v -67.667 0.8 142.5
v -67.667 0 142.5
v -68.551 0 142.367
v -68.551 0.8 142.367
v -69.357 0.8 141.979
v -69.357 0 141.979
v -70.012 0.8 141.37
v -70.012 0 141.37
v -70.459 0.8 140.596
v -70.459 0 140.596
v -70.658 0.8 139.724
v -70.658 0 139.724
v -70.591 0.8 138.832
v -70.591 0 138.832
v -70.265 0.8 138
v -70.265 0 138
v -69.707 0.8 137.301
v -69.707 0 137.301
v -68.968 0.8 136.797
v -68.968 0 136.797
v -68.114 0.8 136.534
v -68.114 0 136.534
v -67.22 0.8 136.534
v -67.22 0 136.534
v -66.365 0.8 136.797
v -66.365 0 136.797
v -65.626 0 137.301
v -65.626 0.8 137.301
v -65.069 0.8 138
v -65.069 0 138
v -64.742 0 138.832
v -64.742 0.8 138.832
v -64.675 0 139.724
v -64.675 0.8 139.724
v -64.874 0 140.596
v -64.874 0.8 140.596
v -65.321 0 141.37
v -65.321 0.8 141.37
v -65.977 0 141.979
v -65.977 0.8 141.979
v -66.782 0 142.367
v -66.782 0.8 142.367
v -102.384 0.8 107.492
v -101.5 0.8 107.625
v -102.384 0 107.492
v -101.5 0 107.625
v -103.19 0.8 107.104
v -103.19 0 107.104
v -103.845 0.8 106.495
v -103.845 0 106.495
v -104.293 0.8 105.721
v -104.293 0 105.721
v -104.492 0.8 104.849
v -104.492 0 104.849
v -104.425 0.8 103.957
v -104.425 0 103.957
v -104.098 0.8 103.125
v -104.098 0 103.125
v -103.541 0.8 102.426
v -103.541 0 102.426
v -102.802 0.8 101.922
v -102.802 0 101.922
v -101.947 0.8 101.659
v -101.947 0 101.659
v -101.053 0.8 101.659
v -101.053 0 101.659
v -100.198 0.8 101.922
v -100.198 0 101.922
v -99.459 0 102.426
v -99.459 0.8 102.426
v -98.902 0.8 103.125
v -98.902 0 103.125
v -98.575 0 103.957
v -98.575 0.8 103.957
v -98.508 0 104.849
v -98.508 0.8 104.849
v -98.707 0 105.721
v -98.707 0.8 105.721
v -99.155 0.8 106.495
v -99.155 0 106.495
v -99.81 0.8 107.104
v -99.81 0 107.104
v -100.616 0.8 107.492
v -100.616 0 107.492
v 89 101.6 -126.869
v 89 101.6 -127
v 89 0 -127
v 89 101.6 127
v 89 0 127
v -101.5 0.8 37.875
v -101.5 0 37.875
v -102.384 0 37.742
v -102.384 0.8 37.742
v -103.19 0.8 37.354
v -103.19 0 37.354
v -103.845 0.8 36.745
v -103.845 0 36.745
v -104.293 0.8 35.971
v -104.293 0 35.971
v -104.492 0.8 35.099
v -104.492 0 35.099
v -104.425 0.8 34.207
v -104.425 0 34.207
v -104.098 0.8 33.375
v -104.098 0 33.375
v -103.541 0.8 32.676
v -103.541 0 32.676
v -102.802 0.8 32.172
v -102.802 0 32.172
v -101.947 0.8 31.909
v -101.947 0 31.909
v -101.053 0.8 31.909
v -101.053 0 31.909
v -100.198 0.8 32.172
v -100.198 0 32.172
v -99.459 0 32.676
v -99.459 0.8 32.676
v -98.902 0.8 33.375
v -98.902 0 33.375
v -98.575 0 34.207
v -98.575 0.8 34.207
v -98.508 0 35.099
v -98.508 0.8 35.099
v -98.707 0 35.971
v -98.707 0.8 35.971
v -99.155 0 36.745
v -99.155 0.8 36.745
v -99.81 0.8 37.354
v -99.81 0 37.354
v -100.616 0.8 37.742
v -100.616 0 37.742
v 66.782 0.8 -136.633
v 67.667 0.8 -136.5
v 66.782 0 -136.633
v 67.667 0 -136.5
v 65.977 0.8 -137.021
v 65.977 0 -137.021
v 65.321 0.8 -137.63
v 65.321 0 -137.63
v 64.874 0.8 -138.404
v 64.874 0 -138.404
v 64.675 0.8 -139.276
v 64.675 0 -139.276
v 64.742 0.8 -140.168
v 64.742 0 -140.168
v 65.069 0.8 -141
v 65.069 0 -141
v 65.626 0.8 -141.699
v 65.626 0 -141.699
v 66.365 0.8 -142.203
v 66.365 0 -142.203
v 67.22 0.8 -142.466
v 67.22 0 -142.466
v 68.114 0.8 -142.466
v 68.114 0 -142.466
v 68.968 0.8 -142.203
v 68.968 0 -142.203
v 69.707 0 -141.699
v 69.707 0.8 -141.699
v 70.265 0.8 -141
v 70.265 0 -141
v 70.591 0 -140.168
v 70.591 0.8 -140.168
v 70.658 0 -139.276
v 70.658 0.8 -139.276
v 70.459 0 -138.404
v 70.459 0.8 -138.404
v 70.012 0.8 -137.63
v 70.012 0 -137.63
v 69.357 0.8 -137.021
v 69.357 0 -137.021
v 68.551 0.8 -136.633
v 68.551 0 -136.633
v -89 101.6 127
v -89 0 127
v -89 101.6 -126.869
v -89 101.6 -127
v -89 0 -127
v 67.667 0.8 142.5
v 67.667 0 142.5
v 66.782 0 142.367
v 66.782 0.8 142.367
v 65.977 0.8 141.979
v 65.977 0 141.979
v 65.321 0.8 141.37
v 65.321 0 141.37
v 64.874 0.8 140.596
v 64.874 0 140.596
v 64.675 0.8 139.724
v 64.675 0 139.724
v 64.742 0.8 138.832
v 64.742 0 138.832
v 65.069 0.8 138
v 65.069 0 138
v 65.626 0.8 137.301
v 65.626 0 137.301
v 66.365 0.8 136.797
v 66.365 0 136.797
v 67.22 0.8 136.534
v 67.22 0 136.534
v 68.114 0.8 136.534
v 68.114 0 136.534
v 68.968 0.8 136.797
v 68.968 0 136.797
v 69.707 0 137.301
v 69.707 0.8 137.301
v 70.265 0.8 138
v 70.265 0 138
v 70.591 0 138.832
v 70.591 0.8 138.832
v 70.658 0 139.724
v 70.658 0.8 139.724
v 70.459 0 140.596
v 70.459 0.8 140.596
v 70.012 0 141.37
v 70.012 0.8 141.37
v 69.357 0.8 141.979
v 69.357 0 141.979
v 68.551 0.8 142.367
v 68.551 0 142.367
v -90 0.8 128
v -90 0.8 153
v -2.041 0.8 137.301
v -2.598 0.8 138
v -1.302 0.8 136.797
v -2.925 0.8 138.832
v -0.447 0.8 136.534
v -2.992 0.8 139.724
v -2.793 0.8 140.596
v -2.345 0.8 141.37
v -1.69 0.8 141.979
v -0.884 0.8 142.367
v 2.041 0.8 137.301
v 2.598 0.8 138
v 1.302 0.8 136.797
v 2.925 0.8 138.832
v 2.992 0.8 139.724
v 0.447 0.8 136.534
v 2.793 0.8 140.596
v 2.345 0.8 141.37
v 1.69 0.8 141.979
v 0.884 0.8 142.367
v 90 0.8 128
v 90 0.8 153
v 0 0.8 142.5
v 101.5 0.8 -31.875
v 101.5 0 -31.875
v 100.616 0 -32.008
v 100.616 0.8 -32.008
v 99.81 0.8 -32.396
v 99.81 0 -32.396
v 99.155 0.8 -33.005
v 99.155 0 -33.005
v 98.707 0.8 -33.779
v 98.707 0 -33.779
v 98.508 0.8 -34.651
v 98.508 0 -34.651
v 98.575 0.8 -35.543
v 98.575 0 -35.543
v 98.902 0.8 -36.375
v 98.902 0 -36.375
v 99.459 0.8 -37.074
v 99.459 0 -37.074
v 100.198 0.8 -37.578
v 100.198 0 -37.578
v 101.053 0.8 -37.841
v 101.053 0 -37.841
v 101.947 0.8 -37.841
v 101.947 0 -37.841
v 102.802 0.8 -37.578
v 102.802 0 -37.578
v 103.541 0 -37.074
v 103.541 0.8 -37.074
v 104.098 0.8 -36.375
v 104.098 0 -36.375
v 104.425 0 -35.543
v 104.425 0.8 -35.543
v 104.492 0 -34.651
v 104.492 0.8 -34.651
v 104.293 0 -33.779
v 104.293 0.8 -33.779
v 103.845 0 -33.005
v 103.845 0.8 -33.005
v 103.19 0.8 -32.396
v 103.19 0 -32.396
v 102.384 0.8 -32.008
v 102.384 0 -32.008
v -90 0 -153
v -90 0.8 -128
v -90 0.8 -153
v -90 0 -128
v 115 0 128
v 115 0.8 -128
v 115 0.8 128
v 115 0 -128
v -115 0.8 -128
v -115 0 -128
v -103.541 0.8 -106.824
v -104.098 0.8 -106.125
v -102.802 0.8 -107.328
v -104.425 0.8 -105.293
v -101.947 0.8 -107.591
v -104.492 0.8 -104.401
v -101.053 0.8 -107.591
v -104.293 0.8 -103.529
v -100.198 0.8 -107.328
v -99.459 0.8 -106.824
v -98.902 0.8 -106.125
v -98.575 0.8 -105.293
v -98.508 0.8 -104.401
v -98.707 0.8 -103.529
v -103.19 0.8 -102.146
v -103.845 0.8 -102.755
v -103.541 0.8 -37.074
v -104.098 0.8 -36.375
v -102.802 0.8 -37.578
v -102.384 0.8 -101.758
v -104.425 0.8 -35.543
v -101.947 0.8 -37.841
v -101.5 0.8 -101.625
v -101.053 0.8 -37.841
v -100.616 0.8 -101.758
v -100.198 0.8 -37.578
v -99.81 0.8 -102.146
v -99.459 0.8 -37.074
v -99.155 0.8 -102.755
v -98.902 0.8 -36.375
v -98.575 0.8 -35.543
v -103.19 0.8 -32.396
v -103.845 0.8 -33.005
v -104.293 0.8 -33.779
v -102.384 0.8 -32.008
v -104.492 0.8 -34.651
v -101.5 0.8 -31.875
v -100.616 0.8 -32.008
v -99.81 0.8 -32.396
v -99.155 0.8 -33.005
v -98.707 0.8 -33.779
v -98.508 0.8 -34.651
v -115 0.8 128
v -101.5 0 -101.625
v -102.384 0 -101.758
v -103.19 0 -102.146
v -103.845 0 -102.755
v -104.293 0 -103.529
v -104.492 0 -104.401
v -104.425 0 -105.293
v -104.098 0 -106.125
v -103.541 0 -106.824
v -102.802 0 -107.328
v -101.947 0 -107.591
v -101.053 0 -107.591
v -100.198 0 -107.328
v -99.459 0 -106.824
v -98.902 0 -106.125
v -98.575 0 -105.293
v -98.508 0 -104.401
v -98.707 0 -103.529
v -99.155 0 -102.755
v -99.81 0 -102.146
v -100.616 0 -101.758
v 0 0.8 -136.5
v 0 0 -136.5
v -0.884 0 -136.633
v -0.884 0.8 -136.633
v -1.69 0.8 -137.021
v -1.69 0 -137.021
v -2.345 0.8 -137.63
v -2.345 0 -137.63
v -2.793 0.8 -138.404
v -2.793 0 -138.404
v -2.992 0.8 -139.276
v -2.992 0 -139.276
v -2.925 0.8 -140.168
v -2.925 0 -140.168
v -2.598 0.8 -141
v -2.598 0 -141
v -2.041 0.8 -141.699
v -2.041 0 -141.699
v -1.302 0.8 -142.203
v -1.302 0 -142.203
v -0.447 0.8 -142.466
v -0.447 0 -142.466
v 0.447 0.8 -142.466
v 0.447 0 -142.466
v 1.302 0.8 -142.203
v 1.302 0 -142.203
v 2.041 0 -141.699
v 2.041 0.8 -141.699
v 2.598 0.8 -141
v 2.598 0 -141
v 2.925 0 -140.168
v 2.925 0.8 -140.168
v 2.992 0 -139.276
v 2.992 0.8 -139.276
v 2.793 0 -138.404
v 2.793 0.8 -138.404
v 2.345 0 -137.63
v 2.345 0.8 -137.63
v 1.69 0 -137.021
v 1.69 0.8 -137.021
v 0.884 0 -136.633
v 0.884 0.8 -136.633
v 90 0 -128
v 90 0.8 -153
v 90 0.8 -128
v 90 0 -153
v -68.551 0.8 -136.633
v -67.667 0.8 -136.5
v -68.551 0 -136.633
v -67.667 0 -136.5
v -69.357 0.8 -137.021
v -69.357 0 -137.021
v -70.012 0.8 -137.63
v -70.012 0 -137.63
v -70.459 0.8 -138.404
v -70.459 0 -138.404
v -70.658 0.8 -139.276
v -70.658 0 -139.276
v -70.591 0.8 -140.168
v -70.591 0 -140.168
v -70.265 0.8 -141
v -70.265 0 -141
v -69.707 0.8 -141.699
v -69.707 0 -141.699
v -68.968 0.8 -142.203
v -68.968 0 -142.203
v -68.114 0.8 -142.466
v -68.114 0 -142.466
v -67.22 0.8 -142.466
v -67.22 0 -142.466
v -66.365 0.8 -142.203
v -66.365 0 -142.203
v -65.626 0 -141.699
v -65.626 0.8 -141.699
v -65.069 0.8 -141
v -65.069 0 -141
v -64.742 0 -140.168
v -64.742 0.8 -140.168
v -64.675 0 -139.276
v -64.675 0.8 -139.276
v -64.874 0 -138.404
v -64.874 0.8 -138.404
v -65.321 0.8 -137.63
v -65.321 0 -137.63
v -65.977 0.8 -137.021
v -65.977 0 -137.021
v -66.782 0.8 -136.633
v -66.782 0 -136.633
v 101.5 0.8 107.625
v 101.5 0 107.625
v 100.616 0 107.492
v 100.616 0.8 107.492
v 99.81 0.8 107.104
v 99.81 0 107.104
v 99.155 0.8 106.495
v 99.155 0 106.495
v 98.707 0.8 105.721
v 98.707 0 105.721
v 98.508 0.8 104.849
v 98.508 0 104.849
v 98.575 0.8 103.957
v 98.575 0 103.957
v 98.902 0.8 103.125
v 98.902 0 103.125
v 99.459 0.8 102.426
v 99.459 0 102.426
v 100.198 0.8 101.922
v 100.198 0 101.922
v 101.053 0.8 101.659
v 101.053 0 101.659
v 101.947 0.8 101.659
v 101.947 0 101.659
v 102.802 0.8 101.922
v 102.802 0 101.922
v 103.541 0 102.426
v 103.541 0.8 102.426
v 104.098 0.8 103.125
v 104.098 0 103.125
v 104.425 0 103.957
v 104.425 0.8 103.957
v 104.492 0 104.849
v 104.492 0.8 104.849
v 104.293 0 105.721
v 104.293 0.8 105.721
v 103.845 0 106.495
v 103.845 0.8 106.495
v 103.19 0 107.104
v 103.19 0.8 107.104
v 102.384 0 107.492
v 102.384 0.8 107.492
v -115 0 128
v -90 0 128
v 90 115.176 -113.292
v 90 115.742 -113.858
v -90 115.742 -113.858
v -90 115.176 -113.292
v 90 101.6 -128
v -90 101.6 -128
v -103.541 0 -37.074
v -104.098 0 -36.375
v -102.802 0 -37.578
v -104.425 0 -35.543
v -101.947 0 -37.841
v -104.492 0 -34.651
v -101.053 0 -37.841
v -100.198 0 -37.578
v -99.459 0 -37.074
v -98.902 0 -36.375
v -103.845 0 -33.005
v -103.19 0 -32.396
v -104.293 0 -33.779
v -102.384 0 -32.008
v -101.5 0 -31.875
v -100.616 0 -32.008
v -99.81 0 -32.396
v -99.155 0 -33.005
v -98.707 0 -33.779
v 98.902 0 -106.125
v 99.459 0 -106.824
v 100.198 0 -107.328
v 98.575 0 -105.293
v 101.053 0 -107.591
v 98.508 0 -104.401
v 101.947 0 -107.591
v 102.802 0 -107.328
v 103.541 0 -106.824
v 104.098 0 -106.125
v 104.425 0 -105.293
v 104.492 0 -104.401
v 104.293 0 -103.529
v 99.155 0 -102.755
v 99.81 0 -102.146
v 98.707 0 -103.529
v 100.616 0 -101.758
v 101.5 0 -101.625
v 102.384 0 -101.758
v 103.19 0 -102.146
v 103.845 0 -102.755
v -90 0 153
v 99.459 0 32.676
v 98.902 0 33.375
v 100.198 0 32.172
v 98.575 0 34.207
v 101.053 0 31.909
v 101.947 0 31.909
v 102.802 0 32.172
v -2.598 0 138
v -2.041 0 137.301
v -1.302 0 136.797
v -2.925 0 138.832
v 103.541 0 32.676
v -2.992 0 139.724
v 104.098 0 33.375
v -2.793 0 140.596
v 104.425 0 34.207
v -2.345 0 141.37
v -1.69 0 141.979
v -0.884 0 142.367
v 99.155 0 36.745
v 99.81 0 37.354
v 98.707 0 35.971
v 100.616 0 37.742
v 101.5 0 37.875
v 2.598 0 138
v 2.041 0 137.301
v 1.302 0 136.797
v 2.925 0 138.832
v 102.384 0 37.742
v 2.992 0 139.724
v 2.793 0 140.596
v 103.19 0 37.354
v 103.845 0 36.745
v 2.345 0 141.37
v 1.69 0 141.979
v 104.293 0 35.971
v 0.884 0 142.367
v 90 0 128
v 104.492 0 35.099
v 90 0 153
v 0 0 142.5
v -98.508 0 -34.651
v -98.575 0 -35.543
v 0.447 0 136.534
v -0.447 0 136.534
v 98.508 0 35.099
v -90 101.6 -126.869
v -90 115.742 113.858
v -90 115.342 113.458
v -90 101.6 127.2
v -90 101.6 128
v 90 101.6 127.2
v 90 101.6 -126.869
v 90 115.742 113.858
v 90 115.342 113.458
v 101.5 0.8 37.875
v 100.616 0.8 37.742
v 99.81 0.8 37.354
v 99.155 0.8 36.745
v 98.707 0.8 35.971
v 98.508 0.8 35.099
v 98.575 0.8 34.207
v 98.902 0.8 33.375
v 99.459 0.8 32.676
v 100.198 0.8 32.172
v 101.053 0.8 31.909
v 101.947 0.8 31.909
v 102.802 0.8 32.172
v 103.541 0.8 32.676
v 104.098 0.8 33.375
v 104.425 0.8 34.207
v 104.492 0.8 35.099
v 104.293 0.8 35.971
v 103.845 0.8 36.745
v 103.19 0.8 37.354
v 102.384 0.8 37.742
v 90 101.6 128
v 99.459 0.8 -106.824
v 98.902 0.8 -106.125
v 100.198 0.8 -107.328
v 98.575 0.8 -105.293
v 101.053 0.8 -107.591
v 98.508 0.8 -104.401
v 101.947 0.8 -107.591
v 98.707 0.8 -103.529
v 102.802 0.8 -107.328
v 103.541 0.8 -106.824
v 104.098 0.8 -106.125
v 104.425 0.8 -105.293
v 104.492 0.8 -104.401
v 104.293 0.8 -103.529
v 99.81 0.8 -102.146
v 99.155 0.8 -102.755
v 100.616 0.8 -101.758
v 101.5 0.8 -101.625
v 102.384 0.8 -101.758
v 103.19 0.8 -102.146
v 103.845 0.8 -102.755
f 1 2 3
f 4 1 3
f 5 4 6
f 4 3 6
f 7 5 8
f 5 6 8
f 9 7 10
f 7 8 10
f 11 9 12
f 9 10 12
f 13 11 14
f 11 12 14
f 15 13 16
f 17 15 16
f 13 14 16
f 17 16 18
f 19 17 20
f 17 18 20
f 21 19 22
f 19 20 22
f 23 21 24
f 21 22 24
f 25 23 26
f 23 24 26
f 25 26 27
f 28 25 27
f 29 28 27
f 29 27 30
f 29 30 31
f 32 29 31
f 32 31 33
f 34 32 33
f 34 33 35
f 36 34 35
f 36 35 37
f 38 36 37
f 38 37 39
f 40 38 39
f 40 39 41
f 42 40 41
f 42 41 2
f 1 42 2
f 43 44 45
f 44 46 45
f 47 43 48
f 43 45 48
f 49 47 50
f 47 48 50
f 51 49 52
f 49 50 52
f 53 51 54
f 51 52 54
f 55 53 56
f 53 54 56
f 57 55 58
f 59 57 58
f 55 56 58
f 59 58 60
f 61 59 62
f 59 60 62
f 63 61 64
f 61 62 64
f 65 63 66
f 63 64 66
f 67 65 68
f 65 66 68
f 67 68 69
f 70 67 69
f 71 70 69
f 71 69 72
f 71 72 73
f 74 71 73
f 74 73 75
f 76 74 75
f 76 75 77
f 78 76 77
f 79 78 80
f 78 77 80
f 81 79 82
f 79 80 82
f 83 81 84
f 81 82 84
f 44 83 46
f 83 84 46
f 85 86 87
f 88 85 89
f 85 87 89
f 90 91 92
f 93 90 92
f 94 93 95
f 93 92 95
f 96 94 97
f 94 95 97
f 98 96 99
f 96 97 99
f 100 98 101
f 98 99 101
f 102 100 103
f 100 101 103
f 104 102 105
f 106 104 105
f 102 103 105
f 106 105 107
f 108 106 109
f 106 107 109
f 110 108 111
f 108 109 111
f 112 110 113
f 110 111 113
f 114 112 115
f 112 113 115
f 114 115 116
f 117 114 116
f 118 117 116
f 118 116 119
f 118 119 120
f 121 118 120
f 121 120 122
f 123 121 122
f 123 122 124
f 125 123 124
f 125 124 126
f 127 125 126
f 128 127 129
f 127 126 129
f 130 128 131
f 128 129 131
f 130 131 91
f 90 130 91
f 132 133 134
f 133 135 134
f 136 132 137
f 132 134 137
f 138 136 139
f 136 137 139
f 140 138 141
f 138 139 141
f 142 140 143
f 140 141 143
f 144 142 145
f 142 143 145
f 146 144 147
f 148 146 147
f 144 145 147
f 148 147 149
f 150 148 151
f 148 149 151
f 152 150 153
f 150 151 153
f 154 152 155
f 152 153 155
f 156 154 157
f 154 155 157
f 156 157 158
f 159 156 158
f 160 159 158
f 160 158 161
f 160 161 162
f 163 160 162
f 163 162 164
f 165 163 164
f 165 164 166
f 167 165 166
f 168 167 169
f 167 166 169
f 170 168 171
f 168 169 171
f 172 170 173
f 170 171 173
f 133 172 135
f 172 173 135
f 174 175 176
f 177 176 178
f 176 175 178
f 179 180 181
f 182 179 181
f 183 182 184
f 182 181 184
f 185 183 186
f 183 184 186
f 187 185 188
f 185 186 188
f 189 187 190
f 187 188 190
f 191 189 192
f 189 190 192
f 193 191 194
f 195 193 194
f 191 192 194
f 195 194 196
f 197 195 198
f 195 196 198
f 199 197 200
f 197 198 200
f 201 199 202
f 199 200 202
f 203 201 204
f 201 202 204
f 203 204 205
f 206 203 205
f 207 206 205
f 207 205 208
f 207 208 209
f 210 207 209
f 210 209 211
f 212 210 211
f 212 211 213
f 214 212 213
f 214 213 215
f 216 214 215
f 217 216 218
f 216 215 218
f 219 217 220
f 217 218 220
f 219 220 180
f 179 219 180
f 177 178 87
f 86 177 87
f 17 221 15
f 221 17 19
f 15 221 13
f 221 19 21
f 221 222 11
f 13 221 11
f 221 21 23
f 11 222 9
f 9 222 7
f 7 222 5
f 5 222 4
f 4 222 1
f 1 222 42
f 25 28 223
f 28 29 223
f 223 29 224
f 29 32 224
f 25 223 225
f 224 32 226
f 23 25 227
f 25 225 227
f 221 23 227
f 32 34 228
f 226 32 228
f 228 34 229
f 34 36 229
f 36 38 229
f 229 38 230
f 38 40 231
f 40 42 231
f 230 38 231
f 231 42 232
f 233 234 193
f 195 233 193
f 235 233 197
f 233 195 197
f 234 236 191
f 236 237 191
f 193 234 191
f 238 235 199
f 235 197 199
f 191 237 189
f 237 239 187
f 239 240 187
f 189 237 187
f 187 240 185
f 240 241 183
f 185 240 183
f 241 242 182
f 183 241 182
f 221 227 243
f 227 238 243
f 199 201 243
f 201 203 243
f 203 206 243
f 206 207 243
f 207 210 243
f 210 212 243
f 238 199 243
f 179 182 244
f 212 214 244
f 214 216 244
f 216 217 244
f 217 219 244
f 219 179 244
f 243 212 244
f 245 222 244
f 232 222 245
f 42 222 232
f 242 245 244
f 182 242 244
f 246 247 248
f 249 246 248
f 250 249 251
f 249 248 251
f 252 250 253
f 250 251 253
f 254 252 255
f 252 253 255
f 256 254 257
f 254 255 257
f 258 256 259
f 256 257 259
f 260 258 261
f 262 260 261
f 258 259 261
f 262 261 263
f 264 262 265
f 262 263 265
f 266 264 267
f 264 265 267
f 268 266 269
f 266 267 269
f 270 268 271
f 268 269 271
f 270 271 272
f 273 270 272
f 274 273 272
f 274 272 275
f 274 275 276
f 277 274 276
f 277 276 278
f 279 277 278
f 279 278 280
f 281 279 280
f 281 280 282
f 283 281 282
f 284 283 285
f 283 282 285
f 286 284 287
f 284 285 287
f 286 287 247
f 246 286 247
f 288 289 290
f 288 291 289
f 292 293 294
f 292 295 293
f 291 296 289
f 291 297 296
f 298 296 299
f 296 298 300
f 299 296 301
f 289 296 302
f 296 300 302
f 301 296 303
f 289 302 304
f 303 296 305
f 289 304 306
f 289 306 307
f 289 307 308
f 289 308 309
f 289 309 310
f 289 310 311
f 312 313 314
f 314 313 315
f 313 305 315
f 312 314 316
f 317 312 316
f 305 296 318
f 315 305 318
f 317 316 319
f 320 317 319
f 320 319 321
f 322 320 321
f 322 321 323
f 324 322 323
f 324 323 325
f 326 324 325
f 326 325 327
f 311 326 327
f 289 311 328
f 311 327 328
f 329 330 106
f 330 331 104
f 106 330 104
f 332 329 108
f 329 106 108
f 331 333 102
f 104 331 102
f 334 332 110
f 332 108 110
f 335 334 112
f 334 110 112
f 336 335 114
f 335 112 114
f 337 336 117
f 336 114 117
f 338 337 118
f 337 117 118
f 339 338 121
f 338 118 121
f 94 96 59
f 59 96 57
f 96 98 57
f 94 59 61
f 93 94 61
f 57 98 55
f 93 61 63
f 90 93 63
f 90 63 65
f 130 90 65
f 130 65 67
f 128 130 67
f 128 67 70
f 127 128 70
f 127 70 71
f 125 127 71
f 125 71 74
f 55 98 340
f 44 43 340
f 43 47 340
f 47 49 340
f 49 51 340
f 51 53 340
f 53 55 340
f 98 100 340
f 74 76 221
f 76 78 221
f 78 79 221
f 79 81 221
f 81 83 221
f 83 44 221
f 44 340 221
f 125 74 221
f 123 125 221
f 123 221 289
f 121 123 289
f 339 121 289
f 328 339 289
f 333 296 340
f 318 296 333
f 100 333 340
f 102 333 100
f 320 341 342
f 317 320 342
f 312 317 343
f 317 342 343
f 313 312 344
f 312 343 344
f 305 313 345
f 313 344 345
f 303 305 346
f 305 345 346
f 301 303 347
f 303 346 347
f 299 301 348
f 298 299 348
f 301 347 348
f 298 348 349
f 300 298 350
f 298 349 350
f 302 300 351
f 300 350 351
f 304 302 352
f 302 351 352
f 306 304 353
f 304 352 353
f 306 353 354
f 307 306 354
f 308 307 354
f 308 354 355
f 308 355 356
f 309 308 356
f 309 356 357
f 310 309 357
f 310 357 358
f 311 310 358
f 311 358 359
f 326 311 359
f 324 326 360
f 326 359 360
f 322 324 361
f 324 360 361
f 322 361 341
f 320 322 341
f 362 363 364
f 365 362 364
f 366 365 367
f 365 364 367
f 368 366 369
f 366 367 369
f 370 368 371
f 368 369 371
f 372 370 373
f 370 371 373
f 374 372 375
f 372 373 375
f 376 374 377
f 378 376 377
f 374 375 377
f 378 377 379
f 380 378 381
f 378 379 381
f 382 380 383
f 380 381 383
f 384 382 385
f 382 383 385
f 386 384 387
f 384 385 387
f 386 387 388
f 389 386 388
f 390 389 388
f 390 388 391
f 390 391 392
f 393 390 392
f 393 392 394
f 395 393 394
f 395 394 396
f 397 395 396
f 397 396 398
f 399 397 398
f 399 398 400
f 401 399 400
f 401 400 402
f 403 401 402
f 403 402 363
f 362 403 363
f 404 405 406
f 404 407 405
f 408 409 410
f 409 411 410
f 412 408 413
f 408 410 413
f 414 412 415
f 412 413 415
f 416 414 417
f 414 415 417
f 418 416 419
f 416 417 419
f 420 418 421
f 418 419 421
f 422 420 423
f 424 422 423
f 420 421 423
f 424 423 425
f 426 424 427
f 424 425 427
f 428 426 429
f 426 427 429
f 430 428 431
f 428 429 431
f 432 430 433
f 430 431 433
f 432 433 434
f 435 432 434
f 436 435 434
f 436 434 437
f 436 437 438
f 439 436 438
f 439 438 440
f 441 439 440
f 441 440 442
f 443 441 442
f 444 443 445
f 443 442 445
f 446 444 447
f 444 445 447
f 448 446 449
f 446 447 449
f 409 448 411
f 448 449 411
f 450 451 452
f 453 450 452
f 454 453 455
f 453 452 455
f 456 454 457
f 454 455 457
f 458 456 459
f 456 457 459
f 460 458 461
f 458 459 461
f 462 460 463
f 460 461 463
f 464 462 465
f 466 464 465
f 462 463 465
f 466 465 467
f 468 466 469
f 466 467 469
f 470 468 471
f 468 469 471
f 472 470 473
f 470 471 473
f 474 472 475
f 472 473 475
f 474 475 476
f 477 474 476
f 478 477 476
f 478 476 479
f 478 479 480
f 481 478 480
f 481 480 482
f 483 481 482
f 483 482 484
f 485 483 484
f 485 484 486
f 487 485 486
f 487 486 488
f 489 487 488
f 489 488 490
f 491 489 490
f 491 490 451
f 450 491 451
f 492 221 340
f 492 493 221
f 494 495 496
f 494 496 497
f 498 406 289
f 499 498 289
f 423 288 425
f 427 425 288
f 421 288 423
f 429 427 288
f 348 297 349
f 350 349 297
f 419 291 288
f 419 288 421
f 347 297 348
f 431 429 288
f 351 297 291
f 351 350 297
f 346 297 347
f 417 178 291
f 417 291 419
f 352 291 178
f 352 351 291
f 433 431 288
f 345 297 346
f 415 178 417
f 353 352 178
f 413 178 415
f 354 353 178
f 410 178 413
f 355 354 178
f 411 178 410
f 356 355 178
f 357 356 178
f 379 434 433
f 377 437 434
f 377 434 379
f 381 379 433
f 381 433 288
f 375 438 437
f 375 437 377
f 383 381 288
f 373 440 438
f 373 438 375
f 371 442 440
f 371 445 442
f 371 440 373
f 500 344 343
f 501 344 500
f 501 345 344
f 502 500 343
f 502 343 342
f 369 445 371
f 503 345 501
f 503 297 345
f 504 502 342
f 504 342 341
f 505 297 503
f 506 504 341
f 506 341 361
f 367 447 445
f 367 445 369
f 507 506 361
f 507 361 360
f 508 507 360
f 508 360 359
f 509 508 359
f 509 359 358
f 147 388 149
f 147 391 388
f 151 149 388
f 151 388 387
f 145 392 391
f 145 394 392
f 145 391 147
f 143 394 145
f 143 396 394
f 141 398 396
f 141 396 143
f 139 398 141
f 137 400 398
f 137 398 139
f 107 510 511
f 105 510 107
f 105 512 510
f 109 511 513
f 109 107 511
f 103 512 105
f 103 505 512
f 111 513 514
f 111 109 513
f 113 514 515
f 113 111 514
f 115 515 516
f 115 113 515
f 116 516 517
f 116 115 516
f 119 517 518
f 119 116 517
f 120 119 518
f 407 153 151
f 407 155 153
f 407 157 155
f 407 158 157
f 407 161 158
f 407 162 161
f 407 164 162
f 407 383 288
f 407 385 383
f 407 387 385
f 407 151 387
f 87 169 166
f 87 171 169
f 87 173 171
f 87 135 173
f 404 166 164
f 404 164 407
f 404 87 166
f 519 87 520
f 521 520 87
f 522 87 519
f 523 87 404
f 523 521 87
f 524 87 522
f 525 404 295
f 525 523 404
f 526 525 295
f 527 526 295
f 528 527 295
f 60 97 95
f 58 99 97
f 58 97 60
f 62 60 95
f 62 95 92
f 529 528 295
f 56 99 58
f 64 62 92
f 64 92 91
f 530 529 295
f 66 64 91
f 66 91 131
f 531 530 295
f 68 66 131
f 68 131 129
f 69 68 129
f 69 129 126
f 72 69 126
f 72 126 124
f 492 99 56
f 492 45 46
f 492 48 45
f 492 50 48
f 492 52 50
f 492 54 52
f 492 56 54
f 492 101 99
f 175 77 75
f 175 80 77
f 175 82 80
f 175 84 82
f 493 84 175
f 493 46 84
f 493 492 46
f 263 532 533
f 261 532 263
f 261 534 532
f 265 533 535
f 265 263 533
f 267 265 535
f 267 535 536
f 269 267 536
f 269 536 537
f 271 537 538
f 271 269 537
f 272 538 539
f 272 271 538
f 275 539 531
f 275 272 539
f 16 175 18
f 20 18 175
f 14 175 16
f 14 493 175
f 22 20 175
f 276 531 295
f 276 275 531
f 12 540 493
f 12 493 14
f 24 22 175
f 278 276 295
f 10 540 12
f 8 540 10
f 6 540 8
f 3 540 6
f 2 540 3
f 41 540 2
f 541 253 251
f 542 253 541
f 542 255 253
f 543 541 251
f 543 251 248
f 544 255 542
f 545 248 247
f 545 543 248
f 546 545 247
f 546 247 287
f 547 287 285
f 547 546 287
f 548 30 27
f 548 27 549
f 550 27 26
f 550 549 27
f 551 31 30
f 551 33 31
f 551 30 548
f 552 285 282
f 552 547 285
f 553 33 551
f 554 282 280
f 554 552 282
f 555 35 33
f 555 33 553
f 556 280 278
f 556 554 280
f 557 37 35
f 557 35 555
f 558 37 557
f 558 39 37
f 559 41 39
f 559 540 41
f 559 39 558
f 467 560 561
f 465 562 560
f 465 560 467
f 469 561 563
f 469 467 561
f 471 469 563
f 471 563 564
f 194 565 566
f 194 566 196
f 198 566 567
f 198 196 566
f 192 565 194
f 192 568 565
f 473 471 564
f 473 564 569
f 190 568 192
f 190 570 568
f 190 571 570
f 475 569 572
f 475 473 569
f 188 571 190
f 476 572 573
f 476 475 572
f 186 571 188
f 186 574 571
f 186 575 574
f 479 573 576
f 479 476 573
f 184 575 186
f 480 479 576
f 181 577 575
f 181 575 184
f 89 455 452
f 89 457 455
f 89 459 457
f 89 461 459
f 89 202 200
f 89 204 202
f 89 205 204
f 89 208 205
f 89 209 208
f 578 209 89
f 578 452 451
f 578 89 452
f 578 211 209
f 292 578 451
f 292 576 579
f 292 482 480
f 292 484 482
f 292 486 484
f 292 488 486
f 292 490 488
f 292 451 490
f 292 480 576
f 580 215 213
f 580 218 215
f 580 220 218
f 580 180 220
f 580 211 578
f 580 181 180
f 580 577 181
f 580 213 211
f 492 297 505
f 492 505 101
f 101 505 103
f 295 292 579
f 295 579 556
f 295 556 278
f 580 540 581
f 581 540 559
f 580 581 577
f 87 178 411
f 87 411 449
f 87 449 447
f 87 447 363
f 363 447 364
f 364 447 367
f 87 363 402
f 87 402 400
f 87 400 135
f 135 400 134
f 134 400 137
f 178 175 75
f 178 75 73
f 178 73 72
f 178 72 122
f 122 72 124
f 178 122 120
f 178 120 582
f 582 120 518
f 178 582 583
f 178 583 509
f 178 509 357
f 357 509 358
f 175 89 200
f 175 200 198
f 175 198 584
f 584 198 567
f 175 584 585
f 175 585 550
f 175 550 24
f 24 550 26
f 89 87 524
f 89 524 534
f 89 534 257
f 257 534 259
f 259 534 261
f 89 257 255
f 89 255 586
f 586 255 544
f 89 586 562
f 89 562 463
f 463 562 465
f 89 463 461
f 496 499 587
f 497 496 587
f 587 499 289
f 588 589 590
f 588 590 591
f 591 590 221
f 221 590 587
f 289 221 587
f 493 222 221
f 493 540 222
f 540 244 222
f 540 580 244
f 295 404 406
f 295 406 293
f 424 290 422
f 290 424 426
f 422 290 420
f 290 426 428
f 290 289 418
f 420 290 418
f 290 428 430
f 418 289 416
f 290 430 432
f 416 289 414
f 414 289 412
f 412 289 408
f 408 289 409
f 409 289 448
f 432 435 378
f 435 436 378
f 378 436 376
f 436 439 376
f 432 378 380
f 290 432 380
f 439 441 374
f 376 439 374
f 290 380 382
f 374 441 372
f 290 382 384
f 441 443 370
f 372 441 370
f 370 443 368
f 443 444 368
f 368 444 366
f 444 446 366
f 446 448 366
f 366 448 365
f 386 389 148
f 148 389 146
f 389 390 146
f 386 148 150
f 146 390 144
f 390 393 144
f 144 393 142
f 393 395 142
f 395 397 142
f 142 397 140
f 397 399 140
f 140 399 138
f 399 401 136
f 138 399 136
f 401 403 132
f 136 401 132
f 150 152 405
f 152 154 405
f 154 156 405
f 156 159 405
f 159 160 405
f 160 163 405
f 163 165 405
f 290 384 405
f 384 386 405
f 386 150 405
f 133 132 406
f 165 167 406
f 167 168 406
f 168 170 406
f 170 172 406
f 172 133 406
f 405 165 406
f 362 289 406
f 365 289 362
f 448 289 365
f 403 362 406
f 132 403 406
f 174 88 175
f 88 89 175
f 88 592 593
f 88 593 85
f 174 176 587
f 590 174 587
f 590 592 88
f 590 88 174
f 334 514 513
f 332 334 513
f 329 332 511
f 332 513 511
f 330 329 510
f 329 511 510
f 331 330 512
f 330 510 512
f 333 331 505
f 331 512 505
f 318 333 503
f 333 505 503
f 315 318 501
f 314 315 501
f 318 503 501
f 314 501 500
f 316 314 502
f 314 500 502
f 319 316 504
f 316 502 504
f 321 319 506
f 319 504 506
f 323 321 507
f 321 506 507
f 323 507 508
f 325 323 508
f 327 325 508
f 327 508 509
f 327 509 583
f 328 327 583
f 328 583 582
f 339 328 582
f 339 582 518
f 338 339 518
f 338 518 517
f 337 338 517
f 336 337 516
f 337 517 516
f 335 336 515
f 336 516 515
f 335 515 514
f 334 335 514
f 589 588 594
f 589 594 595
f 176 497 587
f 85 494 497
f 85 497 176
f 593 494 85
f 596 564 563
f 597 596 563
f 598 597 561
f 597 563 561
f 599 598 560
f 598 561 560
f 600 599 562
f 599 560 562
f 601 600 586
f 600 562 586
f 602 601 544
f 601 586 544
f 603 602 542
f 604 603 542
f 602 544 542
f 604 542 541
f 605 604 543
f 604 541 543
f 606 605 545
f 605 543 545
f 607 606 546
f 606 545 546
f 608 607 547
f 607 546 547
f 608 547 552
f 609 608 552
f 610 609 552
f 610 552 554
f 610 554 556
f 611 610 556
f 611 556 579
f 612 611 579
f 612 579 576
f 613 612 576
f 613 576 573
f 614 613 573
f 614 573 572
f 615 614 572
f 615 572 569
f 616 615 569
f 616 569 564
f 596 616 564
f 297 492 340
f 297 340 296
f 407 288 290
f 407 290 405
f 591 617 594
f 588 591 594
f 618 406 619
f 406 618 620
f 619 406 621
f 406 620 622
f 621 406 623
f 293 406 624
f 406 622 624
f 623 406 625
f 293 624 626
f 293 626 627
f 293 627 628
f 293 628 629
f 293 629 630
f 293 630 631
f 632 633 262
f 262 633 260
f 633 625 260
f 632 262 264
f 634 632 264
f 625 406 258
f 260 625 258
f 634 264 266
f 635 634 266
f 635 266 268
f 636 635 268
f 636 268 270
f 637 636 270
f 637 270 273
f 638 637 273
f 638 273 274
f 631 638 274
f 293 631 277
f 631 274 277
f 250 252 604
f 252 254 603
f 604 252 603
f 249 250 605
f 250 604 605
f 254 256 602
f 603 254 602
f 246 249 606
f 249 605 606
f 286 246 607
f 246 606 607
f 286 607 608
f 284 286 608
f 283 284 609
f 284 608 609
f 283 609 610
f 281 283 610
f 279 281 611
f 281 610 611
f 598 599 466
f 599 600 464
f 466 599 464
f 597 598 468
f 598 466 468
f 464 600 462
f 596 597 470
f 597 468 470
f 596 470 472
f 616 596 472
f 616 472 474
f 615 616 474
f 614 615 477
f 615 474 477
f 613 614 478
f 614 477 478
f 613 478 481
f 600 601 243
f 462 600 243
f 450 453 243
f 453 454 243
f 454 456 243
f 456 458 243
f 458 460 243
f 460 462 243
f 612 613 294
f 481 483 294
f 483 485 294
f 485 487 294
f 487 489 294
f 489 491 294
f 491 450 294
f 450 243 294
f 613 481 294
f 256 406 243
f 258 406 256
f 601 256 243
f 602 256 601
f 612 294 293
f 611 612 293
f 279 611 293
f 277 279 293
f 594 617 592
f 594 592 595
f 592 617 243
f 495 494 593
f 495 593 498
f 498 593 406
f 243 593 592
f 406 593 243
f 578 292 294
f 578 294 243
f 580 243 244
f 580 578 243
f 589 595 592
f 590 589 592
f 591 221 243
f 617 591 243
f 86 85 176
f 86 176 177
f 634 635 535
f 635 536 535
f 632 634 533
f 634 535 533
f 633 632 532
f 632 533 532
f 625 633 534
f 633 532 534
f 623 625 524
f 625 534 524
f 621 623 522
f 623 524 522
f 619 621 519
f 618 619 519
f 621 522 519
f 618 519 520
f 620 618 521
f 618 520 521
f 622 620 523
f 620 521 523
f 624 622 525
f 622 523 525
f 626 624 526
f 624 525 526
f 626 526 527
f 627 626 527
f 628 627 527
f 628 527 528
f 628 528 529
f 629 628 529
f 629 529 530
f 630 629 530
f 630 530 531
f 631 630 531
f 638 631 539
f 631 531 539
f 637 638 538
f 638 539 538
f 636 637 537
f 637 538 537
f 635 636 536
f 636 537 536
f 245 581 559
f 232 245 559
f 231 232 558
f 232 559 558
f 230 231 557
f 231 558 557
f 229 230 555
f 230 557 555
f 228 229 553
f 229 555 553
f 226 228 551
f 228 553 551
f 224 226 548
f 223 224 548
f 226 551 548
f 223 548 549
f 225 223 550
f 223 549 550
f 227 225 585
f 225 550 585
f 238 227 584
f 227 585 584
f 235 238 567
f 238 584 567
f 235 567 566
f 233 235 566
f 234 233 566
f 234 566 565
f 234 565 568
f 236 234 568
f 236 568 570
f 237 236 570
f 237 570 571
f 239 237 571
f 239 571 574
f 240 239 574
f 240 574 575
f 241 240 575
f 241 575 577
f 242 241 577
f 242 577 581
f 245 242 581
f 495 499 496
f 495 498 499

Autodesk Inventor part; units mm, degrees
ref_plane "YZ Plane" through (0, 0, 0) normal (1, 0, 0) x (0, 1, 0)
ref_plane "XZ Plane" through (0, 0, 0) normal (0, 1, 0) x (-1, 0, 0)
ref_plane "XY Plane" through (0, 0, 0) normal (0, 0, 1) x (1, 0, 0)
sketch "Sketch1" plane through (0, 0, 0) normal (0, 1, 0) x (-1, 0, 0)
  line L0 (-89, 127) -> (89, 127)
  line L1 (89, 127) -> (89, -127)
  line L2 (89, -127) -> (-89, -127)
  line L3 (-89, -127) -> (-89, 127)
  line L4 (-89, 127) -> (89, -127) construction
  line L5 (89, 127) -> (-89, -127) construction
  line L6 (90, 128) -> (-90, 128)
  line L7 (-90, 128) -> (-90, -128)
  line L8 (-90, -128) -> (90, -128)
  line L9 (90, -128) -> (90, 128)
  point P0 (0, 0)
  dimension "d0" = 178
  dimension "d1" = 254
  dimension "d2" = 1
extrude "Extrusion1" add sketch "Sketch1" along normal blind 101.6
sketch "Sketch3" plane through (0, 0, 0) normal (0, -1, 0) x (1, 0, 0)
  line L0 (90, 128) -> (90, -128) projected
  line L1 (90, -128) -> (-90, -128) projected
  line L2 (90, 128) -> (90, -128)
  line L3 (90, -128) -> (115, -128)
  line L4 (115, -128) -> (115, 128)
  line L5 (115, 128) -> (90, 128)
  line L6 (90, -128) -> (-90, -128)
  line L7 (-90, -128) -> (-90, -153)
  line L8 (-90, -153) -> (90, -153)
  line L9 (90, -153) -> (90, -128)
  line L10 (-90, 128) -> (90, 128) projected
  line L11 (-90, -128) -> (-90, 128)
  line L12 (-90, 128) -> (-115, 128)
  line L13 (-115, 128) -> (-115, -128)
  line L14 (-115, -128) -> (-90, -128)
  line L15 (-90, 128) -> (90, 128)
  line L16 (90, 128) -> (90, 153)
  line L17 (90, 153) -> (-90, 153)
  line L18 (-90, 153) -> (-90, 128)
  point P0 (0, 0)
  dimension "d11" = 25
  dimension "d12" = 25
  dimension "d13" = 25
  dimension "d14" = 25
extrude "Extrusion3" add sketch "Sketch3" against normal blind 0.8 contours L5 L4 L3 L0 | L10 L18 L17 L16 | L9 L8 L7 L1 | L11 L14 L13 L12
sketch "Sketch4" plane through (0, 0.8, 0) normal (0, 1, 0) x (1, 0, 0)
  line L0 (101.5, 139.5) -> (-101.5, 139.5) construction
  line L1 (-101.5, 139.5) -> (-101.5, -139.5) construction
  line L2 (-101.5, -139.5) -> (101.5, -139.5) construction
  line L3 (101.5, -139.5) -> (101.5, 139.5) construction
  line L4 (101.5, 139.5) -> (-101.5, -139.5) construction
  line L5 (-101.5, 139.5) -> (101.5, -139.5) construction
  line L6 (0, 0) -> (0, -60) construction
  line L7 (0, 0) -> (60, 0) construction
  point P0 (-101.5, 0)
  point P1 (101.5, 0)
  point P2 (101.5, 104.625)
  point P3 (101.5, 69.75)
  point P4 (101.5, 34.875)
  point P5 (101.5, 0)
  point P6 (101.5, -34.875)
  point P7 (101.5, -69.75)
  point P8 (101.5, -104.625)
  point P9 (67.6667, 139.5)
  point P10 (33.8333, 139.5)
  point P11 (0, 139.5)
  point P12 (-33.8333, 139.5)
  point P13 (-67.6667, 139.5)
  point P14 (-101.5, 139.5)
  point P15 (67.6667, -139.5)
  point P16 (33.8333, -139.5)
  point P17 (0, -139.5)
  point P18 (-33.8333, -139.5)
  point P19 (-67.6667, -139.5)
  point P20 (-101.5, -139.5)
  point P21 (-101.5, 104.625)
  point P22 (-101.5, 69.75)
  point P23 (-101.5, 34.875)
  point P24 (-101.5, 0)
  point P25 (-101.5, -34.875)
  point P26 (-101.5, -69.75)
  point P27 (-101.5, -104.625)
  dimension "d18" = 203
  dimension "d19" = 279
  dimension "d21" = 60
  dimension "d22" = 90
  dimension "d63" = 34.875
  dimension "d70" = 33.8333
  dimension "d77" = 33.8333
  dimension "d84" = 34.875
hole "Hole1" at (101.5, 0.8, -139.5) at (101.5, 0.8, -104.625) at (101.5, 0.8, -34.875) at (101.5, 0.8, 34.875) at (101.5, 0.8, 104.625) at (101.5, 0.8, 139.5) at (67.6667, 0.8, -139.5) at (0, 0.8, -139.5) at (-67.6667, 0.8, -139.5) at (-101.5, 0.8, -139.5) at (67.6667, 0.8, 139.5) at (0, 0.8, 139.5) at (-67.6667, 0.8, 139.5) at (-101.5, 0.8, 139.5) at (-101.5, 0.8, -104.625) at (-101.5, 0.8, -34.875) at (-101.5, 0.8, 34.875) at (-101.5, 0.8, 104.625) direction (0, -1, 0) diameter 6 end through all
sketch "Sketch9" plane through (90, 0.8, 128) normal (1, 0, 0) x (0, 0, -1)
  line L0 (0, 100.8) -> (14.1421, 114.9421)
  line L1 (0, 100.8) -> (20, 100.8) construction
  line L2 (14.5421, 114.5421) -> (0.8, 100.8)
  line L3 (14.1421, 114.9421) -> (14.5421, 114.5421)
  line L4 (256, 0) -> (256, 100.8) projected
  line L5 (256, 100.8) -> (241.8579, 114.9421)
  line L6 (256, 100.8) -> (276, 100.8) construction
  line L7 (0, 100.8) -> (256, 100.8) projected
  line L8 (229, 100.8) -> (256, 100.8)
  line L9 (256, 100.8) -> (0, 100.8) projected
  line L10 (0, 100.8) -> (0.8, 100.8)
  line L11 (241.2922, 114.3765) -> (254.8686, 100.8)
  line L12 (241.8579, 114.9421) -> (241.2922, 114.3765)
  point P0 (128, -0.8)
  dimension "d51" = 20
  dimension "d52" = 45
  dimension "d53" = 20
  dimension "d54" = 135
  dimension "d89" = 0.8
extrude "Extrusion8" add sketch "Sketch9" against normal up to surface (180 mm away)
properties part number "chimneyHousing"
